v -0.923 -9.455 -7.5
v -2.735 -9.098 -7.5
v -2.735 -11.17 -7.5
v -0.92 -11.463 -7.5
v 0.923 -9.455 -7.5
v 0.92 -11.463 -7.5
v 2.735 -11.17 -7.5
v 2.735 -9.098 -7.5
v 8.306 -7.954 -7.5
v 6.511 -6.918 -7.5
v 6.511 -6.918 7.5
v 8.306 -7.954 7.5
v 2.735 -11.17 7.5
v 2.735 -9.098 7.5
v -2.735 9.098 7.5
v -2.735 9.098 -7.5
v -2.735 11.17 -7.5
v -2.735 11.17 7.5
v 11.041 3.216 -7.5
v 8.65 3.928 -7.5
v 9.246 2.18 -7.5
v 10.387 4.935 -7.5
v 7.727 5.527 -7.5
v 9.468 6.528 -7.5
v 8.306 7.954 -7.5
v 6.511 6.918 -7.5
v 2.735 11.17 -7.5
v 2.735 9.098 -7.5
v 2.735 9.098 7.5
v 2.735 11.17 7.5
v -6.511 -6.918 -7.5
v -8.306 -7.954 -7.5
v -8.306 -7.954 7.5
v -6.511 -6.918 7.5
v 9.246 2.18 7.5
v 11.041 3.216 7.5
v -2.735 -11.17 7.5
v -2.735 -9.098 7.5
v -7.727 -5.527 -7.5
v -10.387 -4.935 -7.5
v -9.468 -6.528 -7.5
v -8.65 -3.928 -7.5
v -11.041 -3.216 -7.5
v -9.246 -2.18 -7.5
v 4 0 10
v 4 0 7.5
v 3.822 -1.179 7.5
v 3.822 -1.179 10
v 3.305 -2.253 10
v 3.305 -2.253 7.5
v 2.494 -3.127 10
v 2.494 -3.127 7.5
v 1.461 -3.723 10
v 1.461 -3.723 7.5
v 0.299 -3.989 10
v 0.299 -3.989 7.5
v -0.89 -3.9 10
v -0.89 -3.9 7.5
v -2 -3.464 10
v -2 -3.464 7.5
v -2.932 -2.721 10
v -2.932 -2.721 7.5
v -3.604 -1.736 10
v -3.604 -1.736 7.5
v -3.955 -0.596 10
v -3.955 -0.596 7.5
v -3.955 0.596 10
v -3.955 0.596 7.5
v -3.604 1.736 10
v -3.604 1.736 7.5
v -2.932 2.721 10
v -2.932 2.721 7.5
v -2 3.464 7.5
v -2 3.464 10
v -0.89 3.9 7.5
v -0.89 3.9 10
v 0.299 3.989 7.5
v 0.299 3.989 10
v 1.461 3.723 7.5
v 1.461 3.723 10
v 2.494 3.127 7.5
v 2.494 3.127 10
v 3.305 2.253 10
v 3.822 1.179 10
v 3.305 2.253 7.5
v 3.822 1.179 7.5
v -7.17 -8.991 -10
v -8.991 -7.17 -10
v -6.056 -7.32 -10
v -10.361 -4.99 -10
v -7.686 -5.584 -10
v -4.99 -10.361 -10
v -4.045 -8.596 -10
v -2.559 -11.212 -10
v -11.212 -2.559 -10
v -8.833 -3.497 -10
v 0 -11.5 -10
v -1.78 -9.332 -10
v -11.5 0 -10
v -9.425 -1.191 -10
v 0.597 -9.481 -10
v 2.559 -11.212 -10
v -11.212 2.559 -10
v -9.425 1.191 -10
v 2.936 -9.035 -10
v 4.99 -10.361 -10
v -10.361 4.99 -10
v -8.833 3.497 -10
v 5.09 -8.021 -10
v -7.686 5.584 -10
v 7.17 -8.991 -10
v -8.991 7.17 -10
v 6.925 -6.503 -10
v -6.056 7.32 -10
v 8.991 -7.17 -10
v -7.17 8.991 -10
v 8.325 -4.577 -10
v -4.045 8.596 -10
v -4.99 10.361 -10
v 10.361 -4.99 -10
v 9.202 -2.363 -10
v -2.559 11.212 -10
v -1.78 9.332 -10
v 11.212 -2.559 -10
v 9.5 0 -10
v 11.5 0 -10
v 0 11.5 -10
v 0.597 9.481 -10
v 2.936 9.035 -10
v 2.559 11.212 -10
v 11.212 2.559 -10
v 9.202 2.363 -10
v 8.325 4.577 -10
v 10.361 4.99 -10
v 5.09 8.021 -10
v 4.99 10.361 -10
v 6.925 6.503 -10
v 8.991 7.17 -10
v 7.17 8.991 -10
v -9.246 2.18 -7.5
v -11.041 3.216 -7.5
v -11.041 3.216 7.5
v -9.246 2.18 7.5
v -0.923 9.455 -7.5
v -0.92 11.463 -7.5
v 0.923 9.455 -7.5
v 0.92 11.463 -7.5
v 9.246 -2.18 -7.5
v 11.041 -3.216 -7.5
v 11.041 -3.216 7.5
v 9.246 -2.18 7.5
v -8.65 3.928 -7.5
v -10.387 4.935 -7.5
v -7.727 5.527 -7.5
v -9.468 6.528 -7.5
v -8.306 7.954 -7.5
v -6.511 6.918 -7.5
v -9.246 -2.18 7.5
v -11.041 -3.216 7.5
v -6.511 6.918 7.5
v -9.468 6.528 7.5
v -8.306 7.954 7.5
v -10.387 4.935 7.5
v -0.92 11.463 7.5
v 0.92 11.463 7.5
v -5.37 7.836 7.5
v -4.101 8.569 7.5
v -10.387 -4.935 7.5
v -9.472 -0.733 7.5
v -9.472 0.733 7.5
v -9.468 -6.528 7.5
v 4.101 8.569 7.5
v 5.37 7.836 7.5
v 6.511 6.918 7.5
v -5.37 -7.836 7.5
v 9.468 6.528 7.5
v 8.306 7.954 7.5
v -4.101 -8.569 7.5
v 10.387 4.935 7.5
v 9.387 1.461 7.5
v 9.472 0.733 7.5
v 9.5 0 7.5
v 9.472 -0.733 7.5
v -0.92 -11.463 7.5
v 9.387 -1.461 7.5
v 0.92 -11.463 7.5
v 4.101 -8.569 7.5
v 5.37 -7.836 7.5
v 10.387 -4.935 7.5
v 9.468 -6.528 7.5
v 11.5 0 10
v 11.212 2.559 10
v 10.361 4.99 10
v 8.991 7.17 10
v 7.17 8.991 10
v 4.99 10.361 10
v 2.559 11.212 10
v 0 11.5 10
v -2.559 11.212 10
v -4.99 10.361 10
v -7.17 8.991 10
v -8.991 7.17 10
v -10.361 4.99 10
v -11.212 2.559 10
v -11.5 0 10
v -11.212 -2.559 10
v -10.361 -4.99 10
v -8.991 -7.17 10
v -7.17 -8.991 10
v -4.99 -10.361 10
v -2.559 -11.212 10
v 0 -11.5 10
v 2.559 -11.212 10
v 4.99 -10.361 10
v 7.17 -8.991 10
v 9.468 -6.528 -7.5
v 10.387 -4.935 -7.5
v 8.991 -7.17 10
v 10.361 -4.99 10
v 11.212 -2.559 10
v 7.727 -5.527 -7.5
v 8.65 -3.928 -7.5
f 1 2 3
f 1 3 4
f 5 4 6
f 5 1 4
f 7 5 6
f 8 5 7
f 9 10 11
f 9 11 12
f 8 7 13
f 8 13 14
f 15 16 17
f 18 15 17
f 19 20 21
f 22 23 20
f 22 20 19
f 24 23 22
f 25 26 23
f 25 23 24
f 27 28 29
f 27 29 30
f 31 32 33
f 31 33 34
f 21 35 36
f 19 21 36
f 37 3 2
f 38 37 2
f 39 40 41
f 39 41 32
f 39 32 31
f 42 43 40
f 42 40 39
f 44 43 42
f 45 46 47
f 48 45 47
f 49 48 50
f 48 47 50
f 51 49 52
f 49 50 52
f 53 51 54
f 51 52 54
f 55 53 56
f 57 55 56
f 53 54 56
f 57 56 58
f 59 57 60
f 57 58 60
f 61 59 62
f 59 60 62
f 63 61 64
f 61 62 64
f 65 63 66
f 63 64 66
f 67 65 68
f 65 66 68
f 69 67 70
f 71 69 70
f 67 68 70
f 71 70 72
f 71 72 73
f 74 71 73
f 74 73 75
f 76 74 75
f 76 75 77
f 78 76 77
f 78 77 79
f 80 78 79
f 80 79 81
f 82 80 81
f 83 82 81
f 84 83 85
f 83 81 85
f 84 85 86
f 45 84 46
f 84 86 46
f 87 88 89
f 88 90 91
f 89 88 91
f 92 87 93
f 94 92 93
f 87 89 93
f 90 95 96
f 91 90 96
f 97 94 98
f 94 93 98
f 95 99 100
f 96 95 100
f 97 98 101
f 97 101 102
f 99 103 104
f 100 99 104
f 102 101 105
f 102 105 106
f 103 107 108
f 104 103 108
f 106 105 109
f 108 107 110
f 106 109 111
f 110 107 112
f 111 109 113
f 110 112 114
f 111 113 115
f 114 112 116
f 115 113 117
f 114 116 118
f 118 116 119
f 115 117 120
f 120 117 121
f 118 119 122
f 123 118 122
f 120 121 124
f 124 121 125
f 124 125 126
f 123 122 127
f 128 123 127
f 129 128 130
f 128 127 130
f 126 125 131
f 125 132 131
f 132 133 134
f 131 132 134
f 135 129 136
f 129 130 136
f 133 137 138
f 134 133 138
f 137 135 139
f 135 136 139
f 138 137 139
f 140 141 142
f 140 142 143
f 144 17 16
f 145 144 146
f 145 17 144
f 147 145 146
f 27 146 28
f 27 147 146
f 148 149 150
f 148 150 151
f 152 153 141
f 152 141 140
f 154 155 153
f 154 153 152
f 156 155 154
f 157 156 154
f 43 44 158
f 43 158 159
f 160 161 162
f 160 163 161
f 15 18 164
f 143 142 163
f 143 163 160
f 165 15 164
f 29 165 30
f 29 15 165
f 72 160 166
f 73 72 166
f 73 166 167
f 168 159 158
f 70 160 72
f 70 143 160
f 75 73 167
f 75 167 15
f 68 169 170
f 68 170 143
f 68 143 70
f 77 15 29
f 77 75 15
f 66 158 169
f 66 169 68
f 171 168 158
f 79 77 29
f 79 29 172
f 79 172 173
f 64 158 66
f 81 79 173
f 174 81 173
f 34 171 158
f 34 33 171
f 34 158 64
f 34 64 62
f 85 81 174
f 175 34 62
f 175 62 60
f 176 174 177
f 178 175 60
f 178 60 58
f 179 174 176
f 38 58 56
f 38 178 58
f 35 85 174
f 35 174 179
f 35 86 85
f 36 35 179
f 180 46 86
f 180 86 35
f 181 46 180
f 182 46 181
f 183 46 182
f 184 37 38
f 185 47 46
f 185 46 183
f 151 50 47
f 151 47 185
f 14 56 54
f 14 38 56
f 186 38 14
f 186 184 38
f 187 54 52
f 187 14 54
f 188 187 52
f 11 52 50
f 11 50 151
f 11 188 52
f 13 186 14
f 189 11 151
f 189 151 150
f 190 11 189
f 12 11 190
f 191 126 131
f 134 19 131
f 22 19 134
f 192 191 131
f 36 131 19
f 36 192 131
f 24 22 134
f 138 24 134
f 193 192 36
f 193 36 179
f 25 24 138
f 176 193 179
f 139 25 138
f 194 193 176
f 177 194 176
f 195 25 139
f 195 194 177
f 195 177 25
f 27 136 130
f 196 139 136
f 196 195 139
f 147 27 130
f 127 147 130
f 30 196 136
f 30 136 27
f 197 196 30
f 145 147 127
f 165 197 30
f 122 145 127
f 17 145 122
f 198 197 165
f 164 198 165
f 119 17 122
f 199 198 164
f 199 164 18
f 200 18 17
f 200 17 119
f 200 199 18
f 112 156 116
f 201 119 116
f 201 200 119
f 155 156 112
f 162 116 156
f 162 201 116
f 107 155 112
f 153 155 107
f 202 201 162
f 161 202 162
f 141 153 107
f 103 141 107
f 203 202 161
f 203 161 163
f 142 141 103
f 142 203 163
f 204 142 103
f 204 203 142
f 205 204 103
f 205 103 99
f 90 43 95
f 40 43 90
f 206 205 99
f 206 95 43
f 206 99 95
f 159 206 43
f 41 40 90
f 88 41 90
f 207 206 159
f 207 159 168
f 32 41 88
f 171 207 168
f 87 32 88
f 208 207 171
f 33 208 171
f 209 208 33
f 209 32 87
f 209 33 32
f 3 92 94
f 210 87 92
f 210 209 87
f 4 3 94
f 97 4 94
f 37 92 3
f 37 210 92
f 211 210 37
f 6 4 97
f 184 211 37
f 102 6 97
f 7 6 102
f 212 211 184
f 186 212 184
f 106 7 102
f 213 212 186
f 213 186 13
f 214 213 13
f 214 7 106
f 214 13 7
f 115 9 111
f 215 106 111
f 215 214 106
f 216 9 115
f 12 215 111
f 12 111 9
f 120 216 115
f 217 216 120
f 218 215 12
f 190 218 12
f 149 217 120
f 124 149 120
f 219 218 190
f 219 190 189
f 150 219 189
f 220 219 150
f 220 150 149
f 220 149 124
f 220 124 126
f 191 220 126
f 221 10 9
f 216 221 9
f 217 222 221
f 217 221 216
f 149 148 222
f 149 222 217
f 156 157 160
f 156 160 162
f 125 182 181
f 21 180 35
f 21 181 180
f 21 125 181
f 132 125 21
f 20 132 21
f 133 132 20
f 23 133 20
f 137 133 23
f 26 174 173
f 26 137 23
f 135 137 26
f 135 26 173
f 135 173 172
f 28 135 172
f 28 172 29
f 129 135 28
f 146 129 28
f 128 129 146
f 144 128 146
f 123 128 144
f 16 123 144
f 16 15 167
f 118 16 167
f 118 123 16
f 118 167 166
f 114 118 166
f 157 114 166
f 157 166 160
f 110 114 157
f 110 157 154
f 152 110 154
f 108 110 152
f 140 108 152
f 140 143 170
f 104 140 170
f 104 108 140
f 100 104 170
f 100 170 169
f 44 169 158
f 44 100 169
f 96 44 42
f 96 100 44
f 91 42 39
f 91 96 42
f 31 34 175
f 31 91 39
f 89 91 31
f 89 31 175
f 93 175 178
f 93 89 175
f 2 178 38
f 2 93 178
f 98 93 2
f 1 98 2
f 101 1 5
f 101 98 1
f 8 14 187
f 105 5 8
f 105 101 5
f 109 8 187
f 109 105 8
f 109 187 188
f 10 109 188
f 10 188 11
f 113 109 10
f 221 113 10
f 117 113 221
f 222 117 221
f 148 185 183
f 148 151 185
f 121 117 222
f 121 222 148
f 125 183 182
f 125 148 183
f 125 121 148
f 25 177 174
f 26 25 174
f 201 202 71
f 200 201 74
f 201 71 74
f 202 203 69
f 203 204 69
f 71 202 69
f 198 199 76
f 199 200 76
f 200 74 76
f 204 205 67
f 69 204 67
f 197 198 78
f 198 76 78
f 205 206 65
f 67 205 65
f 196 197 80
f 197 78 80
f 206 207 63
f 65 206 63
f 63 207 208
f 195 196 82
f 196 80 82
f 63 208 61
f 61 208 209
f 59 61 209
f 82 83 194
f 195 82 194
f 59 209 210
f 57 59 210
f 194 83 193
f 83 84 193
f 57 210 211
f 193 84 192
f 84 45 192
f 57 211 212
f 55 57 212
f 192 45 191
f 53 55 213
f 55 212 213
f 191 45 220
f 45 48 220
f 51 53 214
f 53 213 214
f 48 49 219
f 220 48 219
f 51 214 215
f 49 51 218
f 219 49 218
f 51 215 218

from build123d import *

# Parameters (mm, degrees)
F0_R     = 11.5
F0_R_2   = 9.5
F1_DEPTH = 10
F2_W     = 5.4703750648
F2_H     = 6.3438538521
F3_DEPTH = 7.5
F4_R     = 4
F5_DEPTH = 2.5


with BuildPart() as f1:
    # F0 (on Top) → F1 (new body, symmetric)
    with BuildSketch(Plane.XY):
        Circle(F0_R)
        Circle(F0_R_2, mode=Mode.SUBTRACT)
    extrude(amount=F1_DEPTH, both=True)

    # F2 (on Top) → F3 (cut, symmetric)
    with BuildSketch(Plane.XY):
        with Locations((0, 9.139645283)):
            Rectangle(F2_W, F2_H)
        Polygon((-3.8006019335, 5.3526010656), (-9.2945405273, 8.5245279917), (-12.0297280597, 3.7870442173), (-6.5357894659, 0.6151172913), align=None)
        Polygon((-6.5357894659, -0.6151172913), (-12.0297280597, -3.7870442173), (-9.2945405273, -8.5245279917), (-3.8006019335, -5.3526010656), align=None)
        with Locations((0, -9.139645283)):
            Rectangle(F2_W, F2_H)
        Polygon((3.8006019335, -5.3526010656), (9.2945405273, -8.5245279917), (12.0297280597, -3.7870442173), (6.5357894659, -0.6151172913), align=None)
        Polygon((6.5357894659, 0.6151172913), (12.0297280597, 3.7870442173), (9.2945405273, 8.5245279917), (3.8006019335, 5.3526010656), align=None)
    extrude(amount=F3_DEPTH, both=True, mode=Mode.SUBTRACT)

    # F4 (on face) → F5 (join, through all)
    with BuildSketch(Plane(origin=(0, 0, 7.5), x_dir=(1, 0, 0), z_dir=(0, 0, -1))):
        with BuildLine():
            ThreePointArc((-2.7351875324, 9.0977331881), (-5.6685852928, -7.6234598955), (9.5, 0))
            ThreePointArc((9.5, 0), (7.6234598955, 5.6685852928), (2.7351875324, 9.0977331881))
            ThreePointArc((2.7351875324, 9.0977331881), (0, 9.5), (-2.7351875324, 9.0977331881))
        make_face()
        Circle(F4_R, mode=Mode.SUBTRACT)
    extrude(amount=-F5_DEPTH)


solid = f1.part
